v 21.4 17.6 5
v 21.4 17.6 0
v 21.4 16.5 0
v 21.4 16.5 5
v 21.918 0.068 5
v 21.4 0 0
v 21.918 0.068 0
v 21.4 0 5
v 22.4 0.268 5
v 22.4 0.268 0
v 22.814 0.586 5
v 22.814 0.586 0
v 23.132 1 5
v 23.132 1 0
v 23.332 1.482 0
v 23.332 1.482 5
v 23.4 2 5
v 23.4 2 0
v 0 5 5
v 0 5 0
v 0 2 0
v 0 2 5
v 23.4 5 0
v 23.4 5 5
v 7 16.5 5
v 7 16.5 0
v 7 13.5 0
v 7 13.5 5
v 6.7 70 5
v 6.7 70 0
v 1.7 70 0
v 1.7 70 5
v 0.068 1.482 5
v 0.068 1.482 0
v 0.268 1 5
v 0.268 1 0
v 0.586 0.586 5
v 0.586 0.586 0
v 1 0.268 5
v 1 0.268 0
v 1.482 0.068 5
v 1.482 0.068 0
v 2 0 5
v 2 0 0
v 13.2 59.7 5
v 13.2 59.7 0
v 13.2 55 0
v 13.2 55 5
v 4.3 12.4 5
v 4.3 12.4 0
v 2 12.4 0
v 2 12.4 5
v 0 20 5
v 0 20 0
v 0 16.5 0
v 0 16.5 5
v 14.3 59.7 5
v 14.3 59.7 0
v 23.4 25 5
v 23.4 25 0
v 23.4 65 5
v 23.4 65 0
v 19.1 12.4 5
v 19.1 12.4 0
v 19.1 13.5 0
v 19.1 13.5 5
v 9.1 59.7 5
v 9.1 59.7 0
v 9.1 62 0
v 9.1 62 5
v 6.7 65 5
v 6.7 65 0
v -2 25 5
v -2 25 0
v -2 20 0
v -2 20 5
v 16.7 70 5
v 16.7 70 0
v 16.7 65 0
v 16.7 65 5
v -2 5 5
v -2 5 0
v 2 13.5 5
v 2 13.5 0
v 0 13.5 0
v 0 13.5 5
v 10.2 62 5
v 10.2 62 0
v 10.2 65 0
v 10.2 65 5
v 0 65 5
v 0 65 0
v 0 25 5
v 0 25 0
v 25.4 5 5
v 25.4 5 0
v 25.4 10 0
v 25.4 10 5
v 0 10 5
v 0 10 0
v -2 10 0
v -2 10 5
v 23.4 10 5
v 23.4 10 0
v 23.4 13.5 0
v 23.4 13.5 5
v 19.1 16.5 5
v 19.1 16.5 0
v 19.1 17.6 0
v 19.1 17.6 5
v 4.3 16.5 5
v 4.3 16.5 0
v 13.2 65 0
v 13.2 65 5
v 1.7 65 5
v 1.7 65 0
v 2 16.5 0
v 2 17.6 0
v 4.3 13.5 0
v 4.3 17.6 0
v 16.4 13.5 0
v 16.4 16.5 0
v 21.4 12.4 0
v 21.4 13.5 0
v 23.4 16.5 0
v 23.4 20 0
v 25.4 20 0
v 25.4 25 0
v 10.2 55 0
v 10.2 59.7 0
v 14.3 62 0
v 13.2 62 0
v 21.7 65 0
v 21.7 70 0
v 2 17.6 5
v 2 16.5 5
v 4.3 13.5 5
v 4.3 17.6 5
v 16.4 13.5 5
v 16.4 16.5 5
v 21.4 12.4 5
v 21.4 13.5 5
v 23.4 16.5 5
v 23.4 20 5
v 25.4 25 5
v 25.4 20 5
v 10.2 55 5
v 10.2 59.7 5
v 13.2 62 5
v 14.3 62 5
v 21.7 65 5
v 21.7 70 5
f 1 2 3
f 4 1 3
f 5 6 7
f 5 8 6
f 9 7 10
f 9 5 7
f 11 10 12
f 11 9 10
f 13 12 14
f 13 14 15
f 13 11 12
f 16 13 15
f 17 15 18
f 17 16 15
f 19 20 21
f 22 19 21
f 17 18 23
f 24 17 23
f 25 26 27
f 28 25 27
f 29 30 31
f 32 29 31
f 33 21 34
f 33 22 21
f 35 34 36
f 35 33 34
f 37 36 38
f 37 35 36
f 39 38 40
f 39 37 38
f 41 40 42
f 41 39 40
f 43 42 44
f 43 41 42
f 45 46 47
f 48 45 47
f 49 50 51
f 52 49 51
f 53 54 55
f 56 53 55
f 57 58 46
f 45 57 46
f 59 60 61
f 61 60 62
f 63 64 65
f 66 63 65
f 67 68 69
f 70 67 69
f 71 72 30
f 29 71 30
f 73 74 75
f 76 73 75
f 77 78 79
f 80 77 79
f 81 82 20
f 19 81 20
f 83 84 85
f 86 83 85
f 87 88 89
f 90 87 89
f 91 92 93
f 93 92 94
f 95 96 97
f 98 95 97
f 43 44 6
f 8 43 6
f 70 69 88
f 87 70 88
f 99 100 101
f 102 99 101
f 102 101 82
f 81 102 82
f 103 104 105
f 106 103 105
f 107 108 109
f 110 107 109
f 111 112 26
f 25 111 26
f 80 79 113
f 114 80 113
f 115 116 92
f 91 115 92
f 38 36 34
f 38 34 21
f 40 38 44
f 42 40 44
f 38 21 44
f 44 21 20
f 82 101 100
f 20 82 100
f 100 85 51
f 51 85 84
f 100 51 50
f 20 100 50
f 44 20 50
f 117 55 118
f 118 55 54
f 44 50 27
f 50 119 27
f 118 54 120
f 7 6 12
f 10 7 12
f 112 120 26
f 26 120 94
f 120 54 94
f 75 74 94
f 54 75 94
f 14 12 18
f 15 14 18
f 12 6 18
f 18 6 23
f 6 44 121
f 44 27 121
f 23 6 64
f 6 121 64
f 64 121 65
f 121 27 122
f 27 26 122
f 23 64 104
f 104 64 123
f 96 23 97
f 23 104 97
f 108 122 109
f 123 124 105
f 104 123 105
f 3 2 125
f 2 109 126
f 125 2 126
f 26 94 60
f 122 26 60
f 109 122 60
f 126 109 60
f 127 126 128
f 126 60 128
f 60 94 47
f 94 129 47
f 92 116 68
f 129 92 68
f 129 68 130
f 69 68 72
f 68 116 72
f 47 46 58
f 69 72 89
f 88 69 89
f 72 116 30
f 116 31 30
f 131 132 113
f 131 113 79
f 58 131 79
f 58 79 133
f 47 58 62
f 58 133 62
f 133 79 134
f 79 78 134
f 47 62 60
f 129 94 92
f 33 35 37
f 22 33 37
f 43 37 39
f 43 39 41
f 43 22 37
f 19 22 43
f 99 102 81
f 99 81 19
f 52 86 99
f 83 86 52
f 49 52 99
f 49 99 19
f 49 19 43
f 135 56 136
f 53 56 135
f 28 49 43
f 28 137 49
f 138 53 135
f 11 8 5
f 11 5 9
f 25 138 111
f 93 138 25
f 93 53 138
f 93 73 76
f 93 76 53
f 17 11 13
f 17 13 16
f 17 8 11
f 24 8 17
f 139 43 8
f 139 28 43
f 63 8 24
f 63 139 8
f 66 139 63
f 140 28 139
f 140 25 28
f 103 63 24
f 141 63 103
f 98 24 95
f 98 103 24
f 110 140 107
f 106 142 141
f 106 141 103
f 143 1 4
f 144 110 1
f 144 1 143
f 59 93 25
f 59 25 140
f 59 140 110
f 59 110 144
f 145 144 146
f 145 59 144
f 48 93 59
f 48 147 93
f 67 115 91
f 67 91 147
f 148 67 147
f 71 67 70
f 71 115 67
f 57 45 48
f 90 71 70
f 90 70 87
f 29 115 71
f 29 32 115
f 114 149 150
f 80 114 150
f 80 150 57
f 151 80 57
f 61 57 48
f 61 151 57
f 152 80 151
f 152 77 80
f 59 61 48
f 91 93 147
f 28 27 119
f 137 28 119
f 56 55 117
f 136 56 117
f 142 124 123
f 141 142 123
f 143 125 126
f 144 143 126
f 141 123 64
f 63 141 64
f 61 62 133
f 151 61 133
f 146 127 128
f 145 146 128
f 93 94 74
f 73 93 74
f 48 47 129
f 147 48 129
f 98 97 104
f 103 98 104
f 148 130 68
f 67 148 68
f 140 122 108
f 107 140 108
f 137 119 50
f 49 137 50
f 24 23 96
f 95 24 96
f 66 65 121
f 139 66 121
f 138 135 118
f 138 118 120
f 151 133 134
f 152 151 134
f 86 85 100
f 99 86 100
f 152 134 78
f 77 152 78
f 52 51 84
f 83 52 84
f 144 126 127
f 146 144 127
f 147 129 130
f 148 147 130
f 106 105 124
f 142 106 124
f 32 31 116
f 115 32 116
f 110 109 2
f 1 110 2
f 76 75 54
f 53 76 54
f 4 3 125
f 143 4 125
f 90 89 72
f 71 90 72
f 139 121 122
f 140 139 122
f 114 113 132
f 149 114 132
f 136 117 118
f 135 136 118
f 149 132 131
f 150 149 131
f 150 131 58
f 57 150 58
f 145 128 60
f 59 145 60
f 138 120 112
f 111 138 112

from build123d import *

# Parameters (mm, degrees)
BOSS_EXTRU_1_DEPTH = 5
FILLET1_R          = 2


with BuildPart() as part:
    # Esquisse1 → Boss.-Extru.1 (new body)
    with BuildSketch(Plane.XY):
        Polygon((1.7, 70), (1.7, 65), (0, 65), (0, 25), (-2, 25), (-2, 20), (0, 20), (0, 16.5), (2, 16.5), (2, 17.6), (4.3, 17.6), (4.3, 16.5), (7, 16.5), (7, 13.5), (4.3, 13.5), (4.3, 12.4), (2, 12.4), (2, 13.5), (0, 13.5), (0, 10), (-2, 10), (-2, 5), (0, 5), (0, 0), (23.4, 0), (23.4, 5), (25.4, 5), (25.4, 10), (23.4, 10), (23.4, 13.5), (21.4, 13.5), (21.4, 12.4), (19.1, 12.4), (19.1, 13.5), (16.4, 13.5), (16.4, 16.5), (19.1, 16.5), (19.1, 17.6), (21.4, 17.6), (21.4, 16.5), (23.4, 16.5), (23.4, 20), (25.4, 20), (25.4, 25), (23.4, 25), (23.4, 65), (21.7, 65), (21.7, 70), (16.7, 70), (16.7, 65), (13.2, 65), (13.2, 62), (14.3, 62), (14.3, 59.7), (13.2, 59.7), (13.2, 55), (10.2, 55), (10.2, 59.7), (9.1, 59.7), (9.1, 62), (10.2, 62), (10.2, 65), (6.7, 65), (6.7, 70), align=None)
    extrude(amount=BOSS_EXTRU_1_DEPTH)

    # Fillet1
    fillet1_edges = [part.edges().sort_by_distance(p)[0] for p in [
        (23.4, 0, 2.5),
        (0, 0, 2.5),
    ]]
    fillet(fillet1_edges, radius=FILLET1_R)


solid = part.part
